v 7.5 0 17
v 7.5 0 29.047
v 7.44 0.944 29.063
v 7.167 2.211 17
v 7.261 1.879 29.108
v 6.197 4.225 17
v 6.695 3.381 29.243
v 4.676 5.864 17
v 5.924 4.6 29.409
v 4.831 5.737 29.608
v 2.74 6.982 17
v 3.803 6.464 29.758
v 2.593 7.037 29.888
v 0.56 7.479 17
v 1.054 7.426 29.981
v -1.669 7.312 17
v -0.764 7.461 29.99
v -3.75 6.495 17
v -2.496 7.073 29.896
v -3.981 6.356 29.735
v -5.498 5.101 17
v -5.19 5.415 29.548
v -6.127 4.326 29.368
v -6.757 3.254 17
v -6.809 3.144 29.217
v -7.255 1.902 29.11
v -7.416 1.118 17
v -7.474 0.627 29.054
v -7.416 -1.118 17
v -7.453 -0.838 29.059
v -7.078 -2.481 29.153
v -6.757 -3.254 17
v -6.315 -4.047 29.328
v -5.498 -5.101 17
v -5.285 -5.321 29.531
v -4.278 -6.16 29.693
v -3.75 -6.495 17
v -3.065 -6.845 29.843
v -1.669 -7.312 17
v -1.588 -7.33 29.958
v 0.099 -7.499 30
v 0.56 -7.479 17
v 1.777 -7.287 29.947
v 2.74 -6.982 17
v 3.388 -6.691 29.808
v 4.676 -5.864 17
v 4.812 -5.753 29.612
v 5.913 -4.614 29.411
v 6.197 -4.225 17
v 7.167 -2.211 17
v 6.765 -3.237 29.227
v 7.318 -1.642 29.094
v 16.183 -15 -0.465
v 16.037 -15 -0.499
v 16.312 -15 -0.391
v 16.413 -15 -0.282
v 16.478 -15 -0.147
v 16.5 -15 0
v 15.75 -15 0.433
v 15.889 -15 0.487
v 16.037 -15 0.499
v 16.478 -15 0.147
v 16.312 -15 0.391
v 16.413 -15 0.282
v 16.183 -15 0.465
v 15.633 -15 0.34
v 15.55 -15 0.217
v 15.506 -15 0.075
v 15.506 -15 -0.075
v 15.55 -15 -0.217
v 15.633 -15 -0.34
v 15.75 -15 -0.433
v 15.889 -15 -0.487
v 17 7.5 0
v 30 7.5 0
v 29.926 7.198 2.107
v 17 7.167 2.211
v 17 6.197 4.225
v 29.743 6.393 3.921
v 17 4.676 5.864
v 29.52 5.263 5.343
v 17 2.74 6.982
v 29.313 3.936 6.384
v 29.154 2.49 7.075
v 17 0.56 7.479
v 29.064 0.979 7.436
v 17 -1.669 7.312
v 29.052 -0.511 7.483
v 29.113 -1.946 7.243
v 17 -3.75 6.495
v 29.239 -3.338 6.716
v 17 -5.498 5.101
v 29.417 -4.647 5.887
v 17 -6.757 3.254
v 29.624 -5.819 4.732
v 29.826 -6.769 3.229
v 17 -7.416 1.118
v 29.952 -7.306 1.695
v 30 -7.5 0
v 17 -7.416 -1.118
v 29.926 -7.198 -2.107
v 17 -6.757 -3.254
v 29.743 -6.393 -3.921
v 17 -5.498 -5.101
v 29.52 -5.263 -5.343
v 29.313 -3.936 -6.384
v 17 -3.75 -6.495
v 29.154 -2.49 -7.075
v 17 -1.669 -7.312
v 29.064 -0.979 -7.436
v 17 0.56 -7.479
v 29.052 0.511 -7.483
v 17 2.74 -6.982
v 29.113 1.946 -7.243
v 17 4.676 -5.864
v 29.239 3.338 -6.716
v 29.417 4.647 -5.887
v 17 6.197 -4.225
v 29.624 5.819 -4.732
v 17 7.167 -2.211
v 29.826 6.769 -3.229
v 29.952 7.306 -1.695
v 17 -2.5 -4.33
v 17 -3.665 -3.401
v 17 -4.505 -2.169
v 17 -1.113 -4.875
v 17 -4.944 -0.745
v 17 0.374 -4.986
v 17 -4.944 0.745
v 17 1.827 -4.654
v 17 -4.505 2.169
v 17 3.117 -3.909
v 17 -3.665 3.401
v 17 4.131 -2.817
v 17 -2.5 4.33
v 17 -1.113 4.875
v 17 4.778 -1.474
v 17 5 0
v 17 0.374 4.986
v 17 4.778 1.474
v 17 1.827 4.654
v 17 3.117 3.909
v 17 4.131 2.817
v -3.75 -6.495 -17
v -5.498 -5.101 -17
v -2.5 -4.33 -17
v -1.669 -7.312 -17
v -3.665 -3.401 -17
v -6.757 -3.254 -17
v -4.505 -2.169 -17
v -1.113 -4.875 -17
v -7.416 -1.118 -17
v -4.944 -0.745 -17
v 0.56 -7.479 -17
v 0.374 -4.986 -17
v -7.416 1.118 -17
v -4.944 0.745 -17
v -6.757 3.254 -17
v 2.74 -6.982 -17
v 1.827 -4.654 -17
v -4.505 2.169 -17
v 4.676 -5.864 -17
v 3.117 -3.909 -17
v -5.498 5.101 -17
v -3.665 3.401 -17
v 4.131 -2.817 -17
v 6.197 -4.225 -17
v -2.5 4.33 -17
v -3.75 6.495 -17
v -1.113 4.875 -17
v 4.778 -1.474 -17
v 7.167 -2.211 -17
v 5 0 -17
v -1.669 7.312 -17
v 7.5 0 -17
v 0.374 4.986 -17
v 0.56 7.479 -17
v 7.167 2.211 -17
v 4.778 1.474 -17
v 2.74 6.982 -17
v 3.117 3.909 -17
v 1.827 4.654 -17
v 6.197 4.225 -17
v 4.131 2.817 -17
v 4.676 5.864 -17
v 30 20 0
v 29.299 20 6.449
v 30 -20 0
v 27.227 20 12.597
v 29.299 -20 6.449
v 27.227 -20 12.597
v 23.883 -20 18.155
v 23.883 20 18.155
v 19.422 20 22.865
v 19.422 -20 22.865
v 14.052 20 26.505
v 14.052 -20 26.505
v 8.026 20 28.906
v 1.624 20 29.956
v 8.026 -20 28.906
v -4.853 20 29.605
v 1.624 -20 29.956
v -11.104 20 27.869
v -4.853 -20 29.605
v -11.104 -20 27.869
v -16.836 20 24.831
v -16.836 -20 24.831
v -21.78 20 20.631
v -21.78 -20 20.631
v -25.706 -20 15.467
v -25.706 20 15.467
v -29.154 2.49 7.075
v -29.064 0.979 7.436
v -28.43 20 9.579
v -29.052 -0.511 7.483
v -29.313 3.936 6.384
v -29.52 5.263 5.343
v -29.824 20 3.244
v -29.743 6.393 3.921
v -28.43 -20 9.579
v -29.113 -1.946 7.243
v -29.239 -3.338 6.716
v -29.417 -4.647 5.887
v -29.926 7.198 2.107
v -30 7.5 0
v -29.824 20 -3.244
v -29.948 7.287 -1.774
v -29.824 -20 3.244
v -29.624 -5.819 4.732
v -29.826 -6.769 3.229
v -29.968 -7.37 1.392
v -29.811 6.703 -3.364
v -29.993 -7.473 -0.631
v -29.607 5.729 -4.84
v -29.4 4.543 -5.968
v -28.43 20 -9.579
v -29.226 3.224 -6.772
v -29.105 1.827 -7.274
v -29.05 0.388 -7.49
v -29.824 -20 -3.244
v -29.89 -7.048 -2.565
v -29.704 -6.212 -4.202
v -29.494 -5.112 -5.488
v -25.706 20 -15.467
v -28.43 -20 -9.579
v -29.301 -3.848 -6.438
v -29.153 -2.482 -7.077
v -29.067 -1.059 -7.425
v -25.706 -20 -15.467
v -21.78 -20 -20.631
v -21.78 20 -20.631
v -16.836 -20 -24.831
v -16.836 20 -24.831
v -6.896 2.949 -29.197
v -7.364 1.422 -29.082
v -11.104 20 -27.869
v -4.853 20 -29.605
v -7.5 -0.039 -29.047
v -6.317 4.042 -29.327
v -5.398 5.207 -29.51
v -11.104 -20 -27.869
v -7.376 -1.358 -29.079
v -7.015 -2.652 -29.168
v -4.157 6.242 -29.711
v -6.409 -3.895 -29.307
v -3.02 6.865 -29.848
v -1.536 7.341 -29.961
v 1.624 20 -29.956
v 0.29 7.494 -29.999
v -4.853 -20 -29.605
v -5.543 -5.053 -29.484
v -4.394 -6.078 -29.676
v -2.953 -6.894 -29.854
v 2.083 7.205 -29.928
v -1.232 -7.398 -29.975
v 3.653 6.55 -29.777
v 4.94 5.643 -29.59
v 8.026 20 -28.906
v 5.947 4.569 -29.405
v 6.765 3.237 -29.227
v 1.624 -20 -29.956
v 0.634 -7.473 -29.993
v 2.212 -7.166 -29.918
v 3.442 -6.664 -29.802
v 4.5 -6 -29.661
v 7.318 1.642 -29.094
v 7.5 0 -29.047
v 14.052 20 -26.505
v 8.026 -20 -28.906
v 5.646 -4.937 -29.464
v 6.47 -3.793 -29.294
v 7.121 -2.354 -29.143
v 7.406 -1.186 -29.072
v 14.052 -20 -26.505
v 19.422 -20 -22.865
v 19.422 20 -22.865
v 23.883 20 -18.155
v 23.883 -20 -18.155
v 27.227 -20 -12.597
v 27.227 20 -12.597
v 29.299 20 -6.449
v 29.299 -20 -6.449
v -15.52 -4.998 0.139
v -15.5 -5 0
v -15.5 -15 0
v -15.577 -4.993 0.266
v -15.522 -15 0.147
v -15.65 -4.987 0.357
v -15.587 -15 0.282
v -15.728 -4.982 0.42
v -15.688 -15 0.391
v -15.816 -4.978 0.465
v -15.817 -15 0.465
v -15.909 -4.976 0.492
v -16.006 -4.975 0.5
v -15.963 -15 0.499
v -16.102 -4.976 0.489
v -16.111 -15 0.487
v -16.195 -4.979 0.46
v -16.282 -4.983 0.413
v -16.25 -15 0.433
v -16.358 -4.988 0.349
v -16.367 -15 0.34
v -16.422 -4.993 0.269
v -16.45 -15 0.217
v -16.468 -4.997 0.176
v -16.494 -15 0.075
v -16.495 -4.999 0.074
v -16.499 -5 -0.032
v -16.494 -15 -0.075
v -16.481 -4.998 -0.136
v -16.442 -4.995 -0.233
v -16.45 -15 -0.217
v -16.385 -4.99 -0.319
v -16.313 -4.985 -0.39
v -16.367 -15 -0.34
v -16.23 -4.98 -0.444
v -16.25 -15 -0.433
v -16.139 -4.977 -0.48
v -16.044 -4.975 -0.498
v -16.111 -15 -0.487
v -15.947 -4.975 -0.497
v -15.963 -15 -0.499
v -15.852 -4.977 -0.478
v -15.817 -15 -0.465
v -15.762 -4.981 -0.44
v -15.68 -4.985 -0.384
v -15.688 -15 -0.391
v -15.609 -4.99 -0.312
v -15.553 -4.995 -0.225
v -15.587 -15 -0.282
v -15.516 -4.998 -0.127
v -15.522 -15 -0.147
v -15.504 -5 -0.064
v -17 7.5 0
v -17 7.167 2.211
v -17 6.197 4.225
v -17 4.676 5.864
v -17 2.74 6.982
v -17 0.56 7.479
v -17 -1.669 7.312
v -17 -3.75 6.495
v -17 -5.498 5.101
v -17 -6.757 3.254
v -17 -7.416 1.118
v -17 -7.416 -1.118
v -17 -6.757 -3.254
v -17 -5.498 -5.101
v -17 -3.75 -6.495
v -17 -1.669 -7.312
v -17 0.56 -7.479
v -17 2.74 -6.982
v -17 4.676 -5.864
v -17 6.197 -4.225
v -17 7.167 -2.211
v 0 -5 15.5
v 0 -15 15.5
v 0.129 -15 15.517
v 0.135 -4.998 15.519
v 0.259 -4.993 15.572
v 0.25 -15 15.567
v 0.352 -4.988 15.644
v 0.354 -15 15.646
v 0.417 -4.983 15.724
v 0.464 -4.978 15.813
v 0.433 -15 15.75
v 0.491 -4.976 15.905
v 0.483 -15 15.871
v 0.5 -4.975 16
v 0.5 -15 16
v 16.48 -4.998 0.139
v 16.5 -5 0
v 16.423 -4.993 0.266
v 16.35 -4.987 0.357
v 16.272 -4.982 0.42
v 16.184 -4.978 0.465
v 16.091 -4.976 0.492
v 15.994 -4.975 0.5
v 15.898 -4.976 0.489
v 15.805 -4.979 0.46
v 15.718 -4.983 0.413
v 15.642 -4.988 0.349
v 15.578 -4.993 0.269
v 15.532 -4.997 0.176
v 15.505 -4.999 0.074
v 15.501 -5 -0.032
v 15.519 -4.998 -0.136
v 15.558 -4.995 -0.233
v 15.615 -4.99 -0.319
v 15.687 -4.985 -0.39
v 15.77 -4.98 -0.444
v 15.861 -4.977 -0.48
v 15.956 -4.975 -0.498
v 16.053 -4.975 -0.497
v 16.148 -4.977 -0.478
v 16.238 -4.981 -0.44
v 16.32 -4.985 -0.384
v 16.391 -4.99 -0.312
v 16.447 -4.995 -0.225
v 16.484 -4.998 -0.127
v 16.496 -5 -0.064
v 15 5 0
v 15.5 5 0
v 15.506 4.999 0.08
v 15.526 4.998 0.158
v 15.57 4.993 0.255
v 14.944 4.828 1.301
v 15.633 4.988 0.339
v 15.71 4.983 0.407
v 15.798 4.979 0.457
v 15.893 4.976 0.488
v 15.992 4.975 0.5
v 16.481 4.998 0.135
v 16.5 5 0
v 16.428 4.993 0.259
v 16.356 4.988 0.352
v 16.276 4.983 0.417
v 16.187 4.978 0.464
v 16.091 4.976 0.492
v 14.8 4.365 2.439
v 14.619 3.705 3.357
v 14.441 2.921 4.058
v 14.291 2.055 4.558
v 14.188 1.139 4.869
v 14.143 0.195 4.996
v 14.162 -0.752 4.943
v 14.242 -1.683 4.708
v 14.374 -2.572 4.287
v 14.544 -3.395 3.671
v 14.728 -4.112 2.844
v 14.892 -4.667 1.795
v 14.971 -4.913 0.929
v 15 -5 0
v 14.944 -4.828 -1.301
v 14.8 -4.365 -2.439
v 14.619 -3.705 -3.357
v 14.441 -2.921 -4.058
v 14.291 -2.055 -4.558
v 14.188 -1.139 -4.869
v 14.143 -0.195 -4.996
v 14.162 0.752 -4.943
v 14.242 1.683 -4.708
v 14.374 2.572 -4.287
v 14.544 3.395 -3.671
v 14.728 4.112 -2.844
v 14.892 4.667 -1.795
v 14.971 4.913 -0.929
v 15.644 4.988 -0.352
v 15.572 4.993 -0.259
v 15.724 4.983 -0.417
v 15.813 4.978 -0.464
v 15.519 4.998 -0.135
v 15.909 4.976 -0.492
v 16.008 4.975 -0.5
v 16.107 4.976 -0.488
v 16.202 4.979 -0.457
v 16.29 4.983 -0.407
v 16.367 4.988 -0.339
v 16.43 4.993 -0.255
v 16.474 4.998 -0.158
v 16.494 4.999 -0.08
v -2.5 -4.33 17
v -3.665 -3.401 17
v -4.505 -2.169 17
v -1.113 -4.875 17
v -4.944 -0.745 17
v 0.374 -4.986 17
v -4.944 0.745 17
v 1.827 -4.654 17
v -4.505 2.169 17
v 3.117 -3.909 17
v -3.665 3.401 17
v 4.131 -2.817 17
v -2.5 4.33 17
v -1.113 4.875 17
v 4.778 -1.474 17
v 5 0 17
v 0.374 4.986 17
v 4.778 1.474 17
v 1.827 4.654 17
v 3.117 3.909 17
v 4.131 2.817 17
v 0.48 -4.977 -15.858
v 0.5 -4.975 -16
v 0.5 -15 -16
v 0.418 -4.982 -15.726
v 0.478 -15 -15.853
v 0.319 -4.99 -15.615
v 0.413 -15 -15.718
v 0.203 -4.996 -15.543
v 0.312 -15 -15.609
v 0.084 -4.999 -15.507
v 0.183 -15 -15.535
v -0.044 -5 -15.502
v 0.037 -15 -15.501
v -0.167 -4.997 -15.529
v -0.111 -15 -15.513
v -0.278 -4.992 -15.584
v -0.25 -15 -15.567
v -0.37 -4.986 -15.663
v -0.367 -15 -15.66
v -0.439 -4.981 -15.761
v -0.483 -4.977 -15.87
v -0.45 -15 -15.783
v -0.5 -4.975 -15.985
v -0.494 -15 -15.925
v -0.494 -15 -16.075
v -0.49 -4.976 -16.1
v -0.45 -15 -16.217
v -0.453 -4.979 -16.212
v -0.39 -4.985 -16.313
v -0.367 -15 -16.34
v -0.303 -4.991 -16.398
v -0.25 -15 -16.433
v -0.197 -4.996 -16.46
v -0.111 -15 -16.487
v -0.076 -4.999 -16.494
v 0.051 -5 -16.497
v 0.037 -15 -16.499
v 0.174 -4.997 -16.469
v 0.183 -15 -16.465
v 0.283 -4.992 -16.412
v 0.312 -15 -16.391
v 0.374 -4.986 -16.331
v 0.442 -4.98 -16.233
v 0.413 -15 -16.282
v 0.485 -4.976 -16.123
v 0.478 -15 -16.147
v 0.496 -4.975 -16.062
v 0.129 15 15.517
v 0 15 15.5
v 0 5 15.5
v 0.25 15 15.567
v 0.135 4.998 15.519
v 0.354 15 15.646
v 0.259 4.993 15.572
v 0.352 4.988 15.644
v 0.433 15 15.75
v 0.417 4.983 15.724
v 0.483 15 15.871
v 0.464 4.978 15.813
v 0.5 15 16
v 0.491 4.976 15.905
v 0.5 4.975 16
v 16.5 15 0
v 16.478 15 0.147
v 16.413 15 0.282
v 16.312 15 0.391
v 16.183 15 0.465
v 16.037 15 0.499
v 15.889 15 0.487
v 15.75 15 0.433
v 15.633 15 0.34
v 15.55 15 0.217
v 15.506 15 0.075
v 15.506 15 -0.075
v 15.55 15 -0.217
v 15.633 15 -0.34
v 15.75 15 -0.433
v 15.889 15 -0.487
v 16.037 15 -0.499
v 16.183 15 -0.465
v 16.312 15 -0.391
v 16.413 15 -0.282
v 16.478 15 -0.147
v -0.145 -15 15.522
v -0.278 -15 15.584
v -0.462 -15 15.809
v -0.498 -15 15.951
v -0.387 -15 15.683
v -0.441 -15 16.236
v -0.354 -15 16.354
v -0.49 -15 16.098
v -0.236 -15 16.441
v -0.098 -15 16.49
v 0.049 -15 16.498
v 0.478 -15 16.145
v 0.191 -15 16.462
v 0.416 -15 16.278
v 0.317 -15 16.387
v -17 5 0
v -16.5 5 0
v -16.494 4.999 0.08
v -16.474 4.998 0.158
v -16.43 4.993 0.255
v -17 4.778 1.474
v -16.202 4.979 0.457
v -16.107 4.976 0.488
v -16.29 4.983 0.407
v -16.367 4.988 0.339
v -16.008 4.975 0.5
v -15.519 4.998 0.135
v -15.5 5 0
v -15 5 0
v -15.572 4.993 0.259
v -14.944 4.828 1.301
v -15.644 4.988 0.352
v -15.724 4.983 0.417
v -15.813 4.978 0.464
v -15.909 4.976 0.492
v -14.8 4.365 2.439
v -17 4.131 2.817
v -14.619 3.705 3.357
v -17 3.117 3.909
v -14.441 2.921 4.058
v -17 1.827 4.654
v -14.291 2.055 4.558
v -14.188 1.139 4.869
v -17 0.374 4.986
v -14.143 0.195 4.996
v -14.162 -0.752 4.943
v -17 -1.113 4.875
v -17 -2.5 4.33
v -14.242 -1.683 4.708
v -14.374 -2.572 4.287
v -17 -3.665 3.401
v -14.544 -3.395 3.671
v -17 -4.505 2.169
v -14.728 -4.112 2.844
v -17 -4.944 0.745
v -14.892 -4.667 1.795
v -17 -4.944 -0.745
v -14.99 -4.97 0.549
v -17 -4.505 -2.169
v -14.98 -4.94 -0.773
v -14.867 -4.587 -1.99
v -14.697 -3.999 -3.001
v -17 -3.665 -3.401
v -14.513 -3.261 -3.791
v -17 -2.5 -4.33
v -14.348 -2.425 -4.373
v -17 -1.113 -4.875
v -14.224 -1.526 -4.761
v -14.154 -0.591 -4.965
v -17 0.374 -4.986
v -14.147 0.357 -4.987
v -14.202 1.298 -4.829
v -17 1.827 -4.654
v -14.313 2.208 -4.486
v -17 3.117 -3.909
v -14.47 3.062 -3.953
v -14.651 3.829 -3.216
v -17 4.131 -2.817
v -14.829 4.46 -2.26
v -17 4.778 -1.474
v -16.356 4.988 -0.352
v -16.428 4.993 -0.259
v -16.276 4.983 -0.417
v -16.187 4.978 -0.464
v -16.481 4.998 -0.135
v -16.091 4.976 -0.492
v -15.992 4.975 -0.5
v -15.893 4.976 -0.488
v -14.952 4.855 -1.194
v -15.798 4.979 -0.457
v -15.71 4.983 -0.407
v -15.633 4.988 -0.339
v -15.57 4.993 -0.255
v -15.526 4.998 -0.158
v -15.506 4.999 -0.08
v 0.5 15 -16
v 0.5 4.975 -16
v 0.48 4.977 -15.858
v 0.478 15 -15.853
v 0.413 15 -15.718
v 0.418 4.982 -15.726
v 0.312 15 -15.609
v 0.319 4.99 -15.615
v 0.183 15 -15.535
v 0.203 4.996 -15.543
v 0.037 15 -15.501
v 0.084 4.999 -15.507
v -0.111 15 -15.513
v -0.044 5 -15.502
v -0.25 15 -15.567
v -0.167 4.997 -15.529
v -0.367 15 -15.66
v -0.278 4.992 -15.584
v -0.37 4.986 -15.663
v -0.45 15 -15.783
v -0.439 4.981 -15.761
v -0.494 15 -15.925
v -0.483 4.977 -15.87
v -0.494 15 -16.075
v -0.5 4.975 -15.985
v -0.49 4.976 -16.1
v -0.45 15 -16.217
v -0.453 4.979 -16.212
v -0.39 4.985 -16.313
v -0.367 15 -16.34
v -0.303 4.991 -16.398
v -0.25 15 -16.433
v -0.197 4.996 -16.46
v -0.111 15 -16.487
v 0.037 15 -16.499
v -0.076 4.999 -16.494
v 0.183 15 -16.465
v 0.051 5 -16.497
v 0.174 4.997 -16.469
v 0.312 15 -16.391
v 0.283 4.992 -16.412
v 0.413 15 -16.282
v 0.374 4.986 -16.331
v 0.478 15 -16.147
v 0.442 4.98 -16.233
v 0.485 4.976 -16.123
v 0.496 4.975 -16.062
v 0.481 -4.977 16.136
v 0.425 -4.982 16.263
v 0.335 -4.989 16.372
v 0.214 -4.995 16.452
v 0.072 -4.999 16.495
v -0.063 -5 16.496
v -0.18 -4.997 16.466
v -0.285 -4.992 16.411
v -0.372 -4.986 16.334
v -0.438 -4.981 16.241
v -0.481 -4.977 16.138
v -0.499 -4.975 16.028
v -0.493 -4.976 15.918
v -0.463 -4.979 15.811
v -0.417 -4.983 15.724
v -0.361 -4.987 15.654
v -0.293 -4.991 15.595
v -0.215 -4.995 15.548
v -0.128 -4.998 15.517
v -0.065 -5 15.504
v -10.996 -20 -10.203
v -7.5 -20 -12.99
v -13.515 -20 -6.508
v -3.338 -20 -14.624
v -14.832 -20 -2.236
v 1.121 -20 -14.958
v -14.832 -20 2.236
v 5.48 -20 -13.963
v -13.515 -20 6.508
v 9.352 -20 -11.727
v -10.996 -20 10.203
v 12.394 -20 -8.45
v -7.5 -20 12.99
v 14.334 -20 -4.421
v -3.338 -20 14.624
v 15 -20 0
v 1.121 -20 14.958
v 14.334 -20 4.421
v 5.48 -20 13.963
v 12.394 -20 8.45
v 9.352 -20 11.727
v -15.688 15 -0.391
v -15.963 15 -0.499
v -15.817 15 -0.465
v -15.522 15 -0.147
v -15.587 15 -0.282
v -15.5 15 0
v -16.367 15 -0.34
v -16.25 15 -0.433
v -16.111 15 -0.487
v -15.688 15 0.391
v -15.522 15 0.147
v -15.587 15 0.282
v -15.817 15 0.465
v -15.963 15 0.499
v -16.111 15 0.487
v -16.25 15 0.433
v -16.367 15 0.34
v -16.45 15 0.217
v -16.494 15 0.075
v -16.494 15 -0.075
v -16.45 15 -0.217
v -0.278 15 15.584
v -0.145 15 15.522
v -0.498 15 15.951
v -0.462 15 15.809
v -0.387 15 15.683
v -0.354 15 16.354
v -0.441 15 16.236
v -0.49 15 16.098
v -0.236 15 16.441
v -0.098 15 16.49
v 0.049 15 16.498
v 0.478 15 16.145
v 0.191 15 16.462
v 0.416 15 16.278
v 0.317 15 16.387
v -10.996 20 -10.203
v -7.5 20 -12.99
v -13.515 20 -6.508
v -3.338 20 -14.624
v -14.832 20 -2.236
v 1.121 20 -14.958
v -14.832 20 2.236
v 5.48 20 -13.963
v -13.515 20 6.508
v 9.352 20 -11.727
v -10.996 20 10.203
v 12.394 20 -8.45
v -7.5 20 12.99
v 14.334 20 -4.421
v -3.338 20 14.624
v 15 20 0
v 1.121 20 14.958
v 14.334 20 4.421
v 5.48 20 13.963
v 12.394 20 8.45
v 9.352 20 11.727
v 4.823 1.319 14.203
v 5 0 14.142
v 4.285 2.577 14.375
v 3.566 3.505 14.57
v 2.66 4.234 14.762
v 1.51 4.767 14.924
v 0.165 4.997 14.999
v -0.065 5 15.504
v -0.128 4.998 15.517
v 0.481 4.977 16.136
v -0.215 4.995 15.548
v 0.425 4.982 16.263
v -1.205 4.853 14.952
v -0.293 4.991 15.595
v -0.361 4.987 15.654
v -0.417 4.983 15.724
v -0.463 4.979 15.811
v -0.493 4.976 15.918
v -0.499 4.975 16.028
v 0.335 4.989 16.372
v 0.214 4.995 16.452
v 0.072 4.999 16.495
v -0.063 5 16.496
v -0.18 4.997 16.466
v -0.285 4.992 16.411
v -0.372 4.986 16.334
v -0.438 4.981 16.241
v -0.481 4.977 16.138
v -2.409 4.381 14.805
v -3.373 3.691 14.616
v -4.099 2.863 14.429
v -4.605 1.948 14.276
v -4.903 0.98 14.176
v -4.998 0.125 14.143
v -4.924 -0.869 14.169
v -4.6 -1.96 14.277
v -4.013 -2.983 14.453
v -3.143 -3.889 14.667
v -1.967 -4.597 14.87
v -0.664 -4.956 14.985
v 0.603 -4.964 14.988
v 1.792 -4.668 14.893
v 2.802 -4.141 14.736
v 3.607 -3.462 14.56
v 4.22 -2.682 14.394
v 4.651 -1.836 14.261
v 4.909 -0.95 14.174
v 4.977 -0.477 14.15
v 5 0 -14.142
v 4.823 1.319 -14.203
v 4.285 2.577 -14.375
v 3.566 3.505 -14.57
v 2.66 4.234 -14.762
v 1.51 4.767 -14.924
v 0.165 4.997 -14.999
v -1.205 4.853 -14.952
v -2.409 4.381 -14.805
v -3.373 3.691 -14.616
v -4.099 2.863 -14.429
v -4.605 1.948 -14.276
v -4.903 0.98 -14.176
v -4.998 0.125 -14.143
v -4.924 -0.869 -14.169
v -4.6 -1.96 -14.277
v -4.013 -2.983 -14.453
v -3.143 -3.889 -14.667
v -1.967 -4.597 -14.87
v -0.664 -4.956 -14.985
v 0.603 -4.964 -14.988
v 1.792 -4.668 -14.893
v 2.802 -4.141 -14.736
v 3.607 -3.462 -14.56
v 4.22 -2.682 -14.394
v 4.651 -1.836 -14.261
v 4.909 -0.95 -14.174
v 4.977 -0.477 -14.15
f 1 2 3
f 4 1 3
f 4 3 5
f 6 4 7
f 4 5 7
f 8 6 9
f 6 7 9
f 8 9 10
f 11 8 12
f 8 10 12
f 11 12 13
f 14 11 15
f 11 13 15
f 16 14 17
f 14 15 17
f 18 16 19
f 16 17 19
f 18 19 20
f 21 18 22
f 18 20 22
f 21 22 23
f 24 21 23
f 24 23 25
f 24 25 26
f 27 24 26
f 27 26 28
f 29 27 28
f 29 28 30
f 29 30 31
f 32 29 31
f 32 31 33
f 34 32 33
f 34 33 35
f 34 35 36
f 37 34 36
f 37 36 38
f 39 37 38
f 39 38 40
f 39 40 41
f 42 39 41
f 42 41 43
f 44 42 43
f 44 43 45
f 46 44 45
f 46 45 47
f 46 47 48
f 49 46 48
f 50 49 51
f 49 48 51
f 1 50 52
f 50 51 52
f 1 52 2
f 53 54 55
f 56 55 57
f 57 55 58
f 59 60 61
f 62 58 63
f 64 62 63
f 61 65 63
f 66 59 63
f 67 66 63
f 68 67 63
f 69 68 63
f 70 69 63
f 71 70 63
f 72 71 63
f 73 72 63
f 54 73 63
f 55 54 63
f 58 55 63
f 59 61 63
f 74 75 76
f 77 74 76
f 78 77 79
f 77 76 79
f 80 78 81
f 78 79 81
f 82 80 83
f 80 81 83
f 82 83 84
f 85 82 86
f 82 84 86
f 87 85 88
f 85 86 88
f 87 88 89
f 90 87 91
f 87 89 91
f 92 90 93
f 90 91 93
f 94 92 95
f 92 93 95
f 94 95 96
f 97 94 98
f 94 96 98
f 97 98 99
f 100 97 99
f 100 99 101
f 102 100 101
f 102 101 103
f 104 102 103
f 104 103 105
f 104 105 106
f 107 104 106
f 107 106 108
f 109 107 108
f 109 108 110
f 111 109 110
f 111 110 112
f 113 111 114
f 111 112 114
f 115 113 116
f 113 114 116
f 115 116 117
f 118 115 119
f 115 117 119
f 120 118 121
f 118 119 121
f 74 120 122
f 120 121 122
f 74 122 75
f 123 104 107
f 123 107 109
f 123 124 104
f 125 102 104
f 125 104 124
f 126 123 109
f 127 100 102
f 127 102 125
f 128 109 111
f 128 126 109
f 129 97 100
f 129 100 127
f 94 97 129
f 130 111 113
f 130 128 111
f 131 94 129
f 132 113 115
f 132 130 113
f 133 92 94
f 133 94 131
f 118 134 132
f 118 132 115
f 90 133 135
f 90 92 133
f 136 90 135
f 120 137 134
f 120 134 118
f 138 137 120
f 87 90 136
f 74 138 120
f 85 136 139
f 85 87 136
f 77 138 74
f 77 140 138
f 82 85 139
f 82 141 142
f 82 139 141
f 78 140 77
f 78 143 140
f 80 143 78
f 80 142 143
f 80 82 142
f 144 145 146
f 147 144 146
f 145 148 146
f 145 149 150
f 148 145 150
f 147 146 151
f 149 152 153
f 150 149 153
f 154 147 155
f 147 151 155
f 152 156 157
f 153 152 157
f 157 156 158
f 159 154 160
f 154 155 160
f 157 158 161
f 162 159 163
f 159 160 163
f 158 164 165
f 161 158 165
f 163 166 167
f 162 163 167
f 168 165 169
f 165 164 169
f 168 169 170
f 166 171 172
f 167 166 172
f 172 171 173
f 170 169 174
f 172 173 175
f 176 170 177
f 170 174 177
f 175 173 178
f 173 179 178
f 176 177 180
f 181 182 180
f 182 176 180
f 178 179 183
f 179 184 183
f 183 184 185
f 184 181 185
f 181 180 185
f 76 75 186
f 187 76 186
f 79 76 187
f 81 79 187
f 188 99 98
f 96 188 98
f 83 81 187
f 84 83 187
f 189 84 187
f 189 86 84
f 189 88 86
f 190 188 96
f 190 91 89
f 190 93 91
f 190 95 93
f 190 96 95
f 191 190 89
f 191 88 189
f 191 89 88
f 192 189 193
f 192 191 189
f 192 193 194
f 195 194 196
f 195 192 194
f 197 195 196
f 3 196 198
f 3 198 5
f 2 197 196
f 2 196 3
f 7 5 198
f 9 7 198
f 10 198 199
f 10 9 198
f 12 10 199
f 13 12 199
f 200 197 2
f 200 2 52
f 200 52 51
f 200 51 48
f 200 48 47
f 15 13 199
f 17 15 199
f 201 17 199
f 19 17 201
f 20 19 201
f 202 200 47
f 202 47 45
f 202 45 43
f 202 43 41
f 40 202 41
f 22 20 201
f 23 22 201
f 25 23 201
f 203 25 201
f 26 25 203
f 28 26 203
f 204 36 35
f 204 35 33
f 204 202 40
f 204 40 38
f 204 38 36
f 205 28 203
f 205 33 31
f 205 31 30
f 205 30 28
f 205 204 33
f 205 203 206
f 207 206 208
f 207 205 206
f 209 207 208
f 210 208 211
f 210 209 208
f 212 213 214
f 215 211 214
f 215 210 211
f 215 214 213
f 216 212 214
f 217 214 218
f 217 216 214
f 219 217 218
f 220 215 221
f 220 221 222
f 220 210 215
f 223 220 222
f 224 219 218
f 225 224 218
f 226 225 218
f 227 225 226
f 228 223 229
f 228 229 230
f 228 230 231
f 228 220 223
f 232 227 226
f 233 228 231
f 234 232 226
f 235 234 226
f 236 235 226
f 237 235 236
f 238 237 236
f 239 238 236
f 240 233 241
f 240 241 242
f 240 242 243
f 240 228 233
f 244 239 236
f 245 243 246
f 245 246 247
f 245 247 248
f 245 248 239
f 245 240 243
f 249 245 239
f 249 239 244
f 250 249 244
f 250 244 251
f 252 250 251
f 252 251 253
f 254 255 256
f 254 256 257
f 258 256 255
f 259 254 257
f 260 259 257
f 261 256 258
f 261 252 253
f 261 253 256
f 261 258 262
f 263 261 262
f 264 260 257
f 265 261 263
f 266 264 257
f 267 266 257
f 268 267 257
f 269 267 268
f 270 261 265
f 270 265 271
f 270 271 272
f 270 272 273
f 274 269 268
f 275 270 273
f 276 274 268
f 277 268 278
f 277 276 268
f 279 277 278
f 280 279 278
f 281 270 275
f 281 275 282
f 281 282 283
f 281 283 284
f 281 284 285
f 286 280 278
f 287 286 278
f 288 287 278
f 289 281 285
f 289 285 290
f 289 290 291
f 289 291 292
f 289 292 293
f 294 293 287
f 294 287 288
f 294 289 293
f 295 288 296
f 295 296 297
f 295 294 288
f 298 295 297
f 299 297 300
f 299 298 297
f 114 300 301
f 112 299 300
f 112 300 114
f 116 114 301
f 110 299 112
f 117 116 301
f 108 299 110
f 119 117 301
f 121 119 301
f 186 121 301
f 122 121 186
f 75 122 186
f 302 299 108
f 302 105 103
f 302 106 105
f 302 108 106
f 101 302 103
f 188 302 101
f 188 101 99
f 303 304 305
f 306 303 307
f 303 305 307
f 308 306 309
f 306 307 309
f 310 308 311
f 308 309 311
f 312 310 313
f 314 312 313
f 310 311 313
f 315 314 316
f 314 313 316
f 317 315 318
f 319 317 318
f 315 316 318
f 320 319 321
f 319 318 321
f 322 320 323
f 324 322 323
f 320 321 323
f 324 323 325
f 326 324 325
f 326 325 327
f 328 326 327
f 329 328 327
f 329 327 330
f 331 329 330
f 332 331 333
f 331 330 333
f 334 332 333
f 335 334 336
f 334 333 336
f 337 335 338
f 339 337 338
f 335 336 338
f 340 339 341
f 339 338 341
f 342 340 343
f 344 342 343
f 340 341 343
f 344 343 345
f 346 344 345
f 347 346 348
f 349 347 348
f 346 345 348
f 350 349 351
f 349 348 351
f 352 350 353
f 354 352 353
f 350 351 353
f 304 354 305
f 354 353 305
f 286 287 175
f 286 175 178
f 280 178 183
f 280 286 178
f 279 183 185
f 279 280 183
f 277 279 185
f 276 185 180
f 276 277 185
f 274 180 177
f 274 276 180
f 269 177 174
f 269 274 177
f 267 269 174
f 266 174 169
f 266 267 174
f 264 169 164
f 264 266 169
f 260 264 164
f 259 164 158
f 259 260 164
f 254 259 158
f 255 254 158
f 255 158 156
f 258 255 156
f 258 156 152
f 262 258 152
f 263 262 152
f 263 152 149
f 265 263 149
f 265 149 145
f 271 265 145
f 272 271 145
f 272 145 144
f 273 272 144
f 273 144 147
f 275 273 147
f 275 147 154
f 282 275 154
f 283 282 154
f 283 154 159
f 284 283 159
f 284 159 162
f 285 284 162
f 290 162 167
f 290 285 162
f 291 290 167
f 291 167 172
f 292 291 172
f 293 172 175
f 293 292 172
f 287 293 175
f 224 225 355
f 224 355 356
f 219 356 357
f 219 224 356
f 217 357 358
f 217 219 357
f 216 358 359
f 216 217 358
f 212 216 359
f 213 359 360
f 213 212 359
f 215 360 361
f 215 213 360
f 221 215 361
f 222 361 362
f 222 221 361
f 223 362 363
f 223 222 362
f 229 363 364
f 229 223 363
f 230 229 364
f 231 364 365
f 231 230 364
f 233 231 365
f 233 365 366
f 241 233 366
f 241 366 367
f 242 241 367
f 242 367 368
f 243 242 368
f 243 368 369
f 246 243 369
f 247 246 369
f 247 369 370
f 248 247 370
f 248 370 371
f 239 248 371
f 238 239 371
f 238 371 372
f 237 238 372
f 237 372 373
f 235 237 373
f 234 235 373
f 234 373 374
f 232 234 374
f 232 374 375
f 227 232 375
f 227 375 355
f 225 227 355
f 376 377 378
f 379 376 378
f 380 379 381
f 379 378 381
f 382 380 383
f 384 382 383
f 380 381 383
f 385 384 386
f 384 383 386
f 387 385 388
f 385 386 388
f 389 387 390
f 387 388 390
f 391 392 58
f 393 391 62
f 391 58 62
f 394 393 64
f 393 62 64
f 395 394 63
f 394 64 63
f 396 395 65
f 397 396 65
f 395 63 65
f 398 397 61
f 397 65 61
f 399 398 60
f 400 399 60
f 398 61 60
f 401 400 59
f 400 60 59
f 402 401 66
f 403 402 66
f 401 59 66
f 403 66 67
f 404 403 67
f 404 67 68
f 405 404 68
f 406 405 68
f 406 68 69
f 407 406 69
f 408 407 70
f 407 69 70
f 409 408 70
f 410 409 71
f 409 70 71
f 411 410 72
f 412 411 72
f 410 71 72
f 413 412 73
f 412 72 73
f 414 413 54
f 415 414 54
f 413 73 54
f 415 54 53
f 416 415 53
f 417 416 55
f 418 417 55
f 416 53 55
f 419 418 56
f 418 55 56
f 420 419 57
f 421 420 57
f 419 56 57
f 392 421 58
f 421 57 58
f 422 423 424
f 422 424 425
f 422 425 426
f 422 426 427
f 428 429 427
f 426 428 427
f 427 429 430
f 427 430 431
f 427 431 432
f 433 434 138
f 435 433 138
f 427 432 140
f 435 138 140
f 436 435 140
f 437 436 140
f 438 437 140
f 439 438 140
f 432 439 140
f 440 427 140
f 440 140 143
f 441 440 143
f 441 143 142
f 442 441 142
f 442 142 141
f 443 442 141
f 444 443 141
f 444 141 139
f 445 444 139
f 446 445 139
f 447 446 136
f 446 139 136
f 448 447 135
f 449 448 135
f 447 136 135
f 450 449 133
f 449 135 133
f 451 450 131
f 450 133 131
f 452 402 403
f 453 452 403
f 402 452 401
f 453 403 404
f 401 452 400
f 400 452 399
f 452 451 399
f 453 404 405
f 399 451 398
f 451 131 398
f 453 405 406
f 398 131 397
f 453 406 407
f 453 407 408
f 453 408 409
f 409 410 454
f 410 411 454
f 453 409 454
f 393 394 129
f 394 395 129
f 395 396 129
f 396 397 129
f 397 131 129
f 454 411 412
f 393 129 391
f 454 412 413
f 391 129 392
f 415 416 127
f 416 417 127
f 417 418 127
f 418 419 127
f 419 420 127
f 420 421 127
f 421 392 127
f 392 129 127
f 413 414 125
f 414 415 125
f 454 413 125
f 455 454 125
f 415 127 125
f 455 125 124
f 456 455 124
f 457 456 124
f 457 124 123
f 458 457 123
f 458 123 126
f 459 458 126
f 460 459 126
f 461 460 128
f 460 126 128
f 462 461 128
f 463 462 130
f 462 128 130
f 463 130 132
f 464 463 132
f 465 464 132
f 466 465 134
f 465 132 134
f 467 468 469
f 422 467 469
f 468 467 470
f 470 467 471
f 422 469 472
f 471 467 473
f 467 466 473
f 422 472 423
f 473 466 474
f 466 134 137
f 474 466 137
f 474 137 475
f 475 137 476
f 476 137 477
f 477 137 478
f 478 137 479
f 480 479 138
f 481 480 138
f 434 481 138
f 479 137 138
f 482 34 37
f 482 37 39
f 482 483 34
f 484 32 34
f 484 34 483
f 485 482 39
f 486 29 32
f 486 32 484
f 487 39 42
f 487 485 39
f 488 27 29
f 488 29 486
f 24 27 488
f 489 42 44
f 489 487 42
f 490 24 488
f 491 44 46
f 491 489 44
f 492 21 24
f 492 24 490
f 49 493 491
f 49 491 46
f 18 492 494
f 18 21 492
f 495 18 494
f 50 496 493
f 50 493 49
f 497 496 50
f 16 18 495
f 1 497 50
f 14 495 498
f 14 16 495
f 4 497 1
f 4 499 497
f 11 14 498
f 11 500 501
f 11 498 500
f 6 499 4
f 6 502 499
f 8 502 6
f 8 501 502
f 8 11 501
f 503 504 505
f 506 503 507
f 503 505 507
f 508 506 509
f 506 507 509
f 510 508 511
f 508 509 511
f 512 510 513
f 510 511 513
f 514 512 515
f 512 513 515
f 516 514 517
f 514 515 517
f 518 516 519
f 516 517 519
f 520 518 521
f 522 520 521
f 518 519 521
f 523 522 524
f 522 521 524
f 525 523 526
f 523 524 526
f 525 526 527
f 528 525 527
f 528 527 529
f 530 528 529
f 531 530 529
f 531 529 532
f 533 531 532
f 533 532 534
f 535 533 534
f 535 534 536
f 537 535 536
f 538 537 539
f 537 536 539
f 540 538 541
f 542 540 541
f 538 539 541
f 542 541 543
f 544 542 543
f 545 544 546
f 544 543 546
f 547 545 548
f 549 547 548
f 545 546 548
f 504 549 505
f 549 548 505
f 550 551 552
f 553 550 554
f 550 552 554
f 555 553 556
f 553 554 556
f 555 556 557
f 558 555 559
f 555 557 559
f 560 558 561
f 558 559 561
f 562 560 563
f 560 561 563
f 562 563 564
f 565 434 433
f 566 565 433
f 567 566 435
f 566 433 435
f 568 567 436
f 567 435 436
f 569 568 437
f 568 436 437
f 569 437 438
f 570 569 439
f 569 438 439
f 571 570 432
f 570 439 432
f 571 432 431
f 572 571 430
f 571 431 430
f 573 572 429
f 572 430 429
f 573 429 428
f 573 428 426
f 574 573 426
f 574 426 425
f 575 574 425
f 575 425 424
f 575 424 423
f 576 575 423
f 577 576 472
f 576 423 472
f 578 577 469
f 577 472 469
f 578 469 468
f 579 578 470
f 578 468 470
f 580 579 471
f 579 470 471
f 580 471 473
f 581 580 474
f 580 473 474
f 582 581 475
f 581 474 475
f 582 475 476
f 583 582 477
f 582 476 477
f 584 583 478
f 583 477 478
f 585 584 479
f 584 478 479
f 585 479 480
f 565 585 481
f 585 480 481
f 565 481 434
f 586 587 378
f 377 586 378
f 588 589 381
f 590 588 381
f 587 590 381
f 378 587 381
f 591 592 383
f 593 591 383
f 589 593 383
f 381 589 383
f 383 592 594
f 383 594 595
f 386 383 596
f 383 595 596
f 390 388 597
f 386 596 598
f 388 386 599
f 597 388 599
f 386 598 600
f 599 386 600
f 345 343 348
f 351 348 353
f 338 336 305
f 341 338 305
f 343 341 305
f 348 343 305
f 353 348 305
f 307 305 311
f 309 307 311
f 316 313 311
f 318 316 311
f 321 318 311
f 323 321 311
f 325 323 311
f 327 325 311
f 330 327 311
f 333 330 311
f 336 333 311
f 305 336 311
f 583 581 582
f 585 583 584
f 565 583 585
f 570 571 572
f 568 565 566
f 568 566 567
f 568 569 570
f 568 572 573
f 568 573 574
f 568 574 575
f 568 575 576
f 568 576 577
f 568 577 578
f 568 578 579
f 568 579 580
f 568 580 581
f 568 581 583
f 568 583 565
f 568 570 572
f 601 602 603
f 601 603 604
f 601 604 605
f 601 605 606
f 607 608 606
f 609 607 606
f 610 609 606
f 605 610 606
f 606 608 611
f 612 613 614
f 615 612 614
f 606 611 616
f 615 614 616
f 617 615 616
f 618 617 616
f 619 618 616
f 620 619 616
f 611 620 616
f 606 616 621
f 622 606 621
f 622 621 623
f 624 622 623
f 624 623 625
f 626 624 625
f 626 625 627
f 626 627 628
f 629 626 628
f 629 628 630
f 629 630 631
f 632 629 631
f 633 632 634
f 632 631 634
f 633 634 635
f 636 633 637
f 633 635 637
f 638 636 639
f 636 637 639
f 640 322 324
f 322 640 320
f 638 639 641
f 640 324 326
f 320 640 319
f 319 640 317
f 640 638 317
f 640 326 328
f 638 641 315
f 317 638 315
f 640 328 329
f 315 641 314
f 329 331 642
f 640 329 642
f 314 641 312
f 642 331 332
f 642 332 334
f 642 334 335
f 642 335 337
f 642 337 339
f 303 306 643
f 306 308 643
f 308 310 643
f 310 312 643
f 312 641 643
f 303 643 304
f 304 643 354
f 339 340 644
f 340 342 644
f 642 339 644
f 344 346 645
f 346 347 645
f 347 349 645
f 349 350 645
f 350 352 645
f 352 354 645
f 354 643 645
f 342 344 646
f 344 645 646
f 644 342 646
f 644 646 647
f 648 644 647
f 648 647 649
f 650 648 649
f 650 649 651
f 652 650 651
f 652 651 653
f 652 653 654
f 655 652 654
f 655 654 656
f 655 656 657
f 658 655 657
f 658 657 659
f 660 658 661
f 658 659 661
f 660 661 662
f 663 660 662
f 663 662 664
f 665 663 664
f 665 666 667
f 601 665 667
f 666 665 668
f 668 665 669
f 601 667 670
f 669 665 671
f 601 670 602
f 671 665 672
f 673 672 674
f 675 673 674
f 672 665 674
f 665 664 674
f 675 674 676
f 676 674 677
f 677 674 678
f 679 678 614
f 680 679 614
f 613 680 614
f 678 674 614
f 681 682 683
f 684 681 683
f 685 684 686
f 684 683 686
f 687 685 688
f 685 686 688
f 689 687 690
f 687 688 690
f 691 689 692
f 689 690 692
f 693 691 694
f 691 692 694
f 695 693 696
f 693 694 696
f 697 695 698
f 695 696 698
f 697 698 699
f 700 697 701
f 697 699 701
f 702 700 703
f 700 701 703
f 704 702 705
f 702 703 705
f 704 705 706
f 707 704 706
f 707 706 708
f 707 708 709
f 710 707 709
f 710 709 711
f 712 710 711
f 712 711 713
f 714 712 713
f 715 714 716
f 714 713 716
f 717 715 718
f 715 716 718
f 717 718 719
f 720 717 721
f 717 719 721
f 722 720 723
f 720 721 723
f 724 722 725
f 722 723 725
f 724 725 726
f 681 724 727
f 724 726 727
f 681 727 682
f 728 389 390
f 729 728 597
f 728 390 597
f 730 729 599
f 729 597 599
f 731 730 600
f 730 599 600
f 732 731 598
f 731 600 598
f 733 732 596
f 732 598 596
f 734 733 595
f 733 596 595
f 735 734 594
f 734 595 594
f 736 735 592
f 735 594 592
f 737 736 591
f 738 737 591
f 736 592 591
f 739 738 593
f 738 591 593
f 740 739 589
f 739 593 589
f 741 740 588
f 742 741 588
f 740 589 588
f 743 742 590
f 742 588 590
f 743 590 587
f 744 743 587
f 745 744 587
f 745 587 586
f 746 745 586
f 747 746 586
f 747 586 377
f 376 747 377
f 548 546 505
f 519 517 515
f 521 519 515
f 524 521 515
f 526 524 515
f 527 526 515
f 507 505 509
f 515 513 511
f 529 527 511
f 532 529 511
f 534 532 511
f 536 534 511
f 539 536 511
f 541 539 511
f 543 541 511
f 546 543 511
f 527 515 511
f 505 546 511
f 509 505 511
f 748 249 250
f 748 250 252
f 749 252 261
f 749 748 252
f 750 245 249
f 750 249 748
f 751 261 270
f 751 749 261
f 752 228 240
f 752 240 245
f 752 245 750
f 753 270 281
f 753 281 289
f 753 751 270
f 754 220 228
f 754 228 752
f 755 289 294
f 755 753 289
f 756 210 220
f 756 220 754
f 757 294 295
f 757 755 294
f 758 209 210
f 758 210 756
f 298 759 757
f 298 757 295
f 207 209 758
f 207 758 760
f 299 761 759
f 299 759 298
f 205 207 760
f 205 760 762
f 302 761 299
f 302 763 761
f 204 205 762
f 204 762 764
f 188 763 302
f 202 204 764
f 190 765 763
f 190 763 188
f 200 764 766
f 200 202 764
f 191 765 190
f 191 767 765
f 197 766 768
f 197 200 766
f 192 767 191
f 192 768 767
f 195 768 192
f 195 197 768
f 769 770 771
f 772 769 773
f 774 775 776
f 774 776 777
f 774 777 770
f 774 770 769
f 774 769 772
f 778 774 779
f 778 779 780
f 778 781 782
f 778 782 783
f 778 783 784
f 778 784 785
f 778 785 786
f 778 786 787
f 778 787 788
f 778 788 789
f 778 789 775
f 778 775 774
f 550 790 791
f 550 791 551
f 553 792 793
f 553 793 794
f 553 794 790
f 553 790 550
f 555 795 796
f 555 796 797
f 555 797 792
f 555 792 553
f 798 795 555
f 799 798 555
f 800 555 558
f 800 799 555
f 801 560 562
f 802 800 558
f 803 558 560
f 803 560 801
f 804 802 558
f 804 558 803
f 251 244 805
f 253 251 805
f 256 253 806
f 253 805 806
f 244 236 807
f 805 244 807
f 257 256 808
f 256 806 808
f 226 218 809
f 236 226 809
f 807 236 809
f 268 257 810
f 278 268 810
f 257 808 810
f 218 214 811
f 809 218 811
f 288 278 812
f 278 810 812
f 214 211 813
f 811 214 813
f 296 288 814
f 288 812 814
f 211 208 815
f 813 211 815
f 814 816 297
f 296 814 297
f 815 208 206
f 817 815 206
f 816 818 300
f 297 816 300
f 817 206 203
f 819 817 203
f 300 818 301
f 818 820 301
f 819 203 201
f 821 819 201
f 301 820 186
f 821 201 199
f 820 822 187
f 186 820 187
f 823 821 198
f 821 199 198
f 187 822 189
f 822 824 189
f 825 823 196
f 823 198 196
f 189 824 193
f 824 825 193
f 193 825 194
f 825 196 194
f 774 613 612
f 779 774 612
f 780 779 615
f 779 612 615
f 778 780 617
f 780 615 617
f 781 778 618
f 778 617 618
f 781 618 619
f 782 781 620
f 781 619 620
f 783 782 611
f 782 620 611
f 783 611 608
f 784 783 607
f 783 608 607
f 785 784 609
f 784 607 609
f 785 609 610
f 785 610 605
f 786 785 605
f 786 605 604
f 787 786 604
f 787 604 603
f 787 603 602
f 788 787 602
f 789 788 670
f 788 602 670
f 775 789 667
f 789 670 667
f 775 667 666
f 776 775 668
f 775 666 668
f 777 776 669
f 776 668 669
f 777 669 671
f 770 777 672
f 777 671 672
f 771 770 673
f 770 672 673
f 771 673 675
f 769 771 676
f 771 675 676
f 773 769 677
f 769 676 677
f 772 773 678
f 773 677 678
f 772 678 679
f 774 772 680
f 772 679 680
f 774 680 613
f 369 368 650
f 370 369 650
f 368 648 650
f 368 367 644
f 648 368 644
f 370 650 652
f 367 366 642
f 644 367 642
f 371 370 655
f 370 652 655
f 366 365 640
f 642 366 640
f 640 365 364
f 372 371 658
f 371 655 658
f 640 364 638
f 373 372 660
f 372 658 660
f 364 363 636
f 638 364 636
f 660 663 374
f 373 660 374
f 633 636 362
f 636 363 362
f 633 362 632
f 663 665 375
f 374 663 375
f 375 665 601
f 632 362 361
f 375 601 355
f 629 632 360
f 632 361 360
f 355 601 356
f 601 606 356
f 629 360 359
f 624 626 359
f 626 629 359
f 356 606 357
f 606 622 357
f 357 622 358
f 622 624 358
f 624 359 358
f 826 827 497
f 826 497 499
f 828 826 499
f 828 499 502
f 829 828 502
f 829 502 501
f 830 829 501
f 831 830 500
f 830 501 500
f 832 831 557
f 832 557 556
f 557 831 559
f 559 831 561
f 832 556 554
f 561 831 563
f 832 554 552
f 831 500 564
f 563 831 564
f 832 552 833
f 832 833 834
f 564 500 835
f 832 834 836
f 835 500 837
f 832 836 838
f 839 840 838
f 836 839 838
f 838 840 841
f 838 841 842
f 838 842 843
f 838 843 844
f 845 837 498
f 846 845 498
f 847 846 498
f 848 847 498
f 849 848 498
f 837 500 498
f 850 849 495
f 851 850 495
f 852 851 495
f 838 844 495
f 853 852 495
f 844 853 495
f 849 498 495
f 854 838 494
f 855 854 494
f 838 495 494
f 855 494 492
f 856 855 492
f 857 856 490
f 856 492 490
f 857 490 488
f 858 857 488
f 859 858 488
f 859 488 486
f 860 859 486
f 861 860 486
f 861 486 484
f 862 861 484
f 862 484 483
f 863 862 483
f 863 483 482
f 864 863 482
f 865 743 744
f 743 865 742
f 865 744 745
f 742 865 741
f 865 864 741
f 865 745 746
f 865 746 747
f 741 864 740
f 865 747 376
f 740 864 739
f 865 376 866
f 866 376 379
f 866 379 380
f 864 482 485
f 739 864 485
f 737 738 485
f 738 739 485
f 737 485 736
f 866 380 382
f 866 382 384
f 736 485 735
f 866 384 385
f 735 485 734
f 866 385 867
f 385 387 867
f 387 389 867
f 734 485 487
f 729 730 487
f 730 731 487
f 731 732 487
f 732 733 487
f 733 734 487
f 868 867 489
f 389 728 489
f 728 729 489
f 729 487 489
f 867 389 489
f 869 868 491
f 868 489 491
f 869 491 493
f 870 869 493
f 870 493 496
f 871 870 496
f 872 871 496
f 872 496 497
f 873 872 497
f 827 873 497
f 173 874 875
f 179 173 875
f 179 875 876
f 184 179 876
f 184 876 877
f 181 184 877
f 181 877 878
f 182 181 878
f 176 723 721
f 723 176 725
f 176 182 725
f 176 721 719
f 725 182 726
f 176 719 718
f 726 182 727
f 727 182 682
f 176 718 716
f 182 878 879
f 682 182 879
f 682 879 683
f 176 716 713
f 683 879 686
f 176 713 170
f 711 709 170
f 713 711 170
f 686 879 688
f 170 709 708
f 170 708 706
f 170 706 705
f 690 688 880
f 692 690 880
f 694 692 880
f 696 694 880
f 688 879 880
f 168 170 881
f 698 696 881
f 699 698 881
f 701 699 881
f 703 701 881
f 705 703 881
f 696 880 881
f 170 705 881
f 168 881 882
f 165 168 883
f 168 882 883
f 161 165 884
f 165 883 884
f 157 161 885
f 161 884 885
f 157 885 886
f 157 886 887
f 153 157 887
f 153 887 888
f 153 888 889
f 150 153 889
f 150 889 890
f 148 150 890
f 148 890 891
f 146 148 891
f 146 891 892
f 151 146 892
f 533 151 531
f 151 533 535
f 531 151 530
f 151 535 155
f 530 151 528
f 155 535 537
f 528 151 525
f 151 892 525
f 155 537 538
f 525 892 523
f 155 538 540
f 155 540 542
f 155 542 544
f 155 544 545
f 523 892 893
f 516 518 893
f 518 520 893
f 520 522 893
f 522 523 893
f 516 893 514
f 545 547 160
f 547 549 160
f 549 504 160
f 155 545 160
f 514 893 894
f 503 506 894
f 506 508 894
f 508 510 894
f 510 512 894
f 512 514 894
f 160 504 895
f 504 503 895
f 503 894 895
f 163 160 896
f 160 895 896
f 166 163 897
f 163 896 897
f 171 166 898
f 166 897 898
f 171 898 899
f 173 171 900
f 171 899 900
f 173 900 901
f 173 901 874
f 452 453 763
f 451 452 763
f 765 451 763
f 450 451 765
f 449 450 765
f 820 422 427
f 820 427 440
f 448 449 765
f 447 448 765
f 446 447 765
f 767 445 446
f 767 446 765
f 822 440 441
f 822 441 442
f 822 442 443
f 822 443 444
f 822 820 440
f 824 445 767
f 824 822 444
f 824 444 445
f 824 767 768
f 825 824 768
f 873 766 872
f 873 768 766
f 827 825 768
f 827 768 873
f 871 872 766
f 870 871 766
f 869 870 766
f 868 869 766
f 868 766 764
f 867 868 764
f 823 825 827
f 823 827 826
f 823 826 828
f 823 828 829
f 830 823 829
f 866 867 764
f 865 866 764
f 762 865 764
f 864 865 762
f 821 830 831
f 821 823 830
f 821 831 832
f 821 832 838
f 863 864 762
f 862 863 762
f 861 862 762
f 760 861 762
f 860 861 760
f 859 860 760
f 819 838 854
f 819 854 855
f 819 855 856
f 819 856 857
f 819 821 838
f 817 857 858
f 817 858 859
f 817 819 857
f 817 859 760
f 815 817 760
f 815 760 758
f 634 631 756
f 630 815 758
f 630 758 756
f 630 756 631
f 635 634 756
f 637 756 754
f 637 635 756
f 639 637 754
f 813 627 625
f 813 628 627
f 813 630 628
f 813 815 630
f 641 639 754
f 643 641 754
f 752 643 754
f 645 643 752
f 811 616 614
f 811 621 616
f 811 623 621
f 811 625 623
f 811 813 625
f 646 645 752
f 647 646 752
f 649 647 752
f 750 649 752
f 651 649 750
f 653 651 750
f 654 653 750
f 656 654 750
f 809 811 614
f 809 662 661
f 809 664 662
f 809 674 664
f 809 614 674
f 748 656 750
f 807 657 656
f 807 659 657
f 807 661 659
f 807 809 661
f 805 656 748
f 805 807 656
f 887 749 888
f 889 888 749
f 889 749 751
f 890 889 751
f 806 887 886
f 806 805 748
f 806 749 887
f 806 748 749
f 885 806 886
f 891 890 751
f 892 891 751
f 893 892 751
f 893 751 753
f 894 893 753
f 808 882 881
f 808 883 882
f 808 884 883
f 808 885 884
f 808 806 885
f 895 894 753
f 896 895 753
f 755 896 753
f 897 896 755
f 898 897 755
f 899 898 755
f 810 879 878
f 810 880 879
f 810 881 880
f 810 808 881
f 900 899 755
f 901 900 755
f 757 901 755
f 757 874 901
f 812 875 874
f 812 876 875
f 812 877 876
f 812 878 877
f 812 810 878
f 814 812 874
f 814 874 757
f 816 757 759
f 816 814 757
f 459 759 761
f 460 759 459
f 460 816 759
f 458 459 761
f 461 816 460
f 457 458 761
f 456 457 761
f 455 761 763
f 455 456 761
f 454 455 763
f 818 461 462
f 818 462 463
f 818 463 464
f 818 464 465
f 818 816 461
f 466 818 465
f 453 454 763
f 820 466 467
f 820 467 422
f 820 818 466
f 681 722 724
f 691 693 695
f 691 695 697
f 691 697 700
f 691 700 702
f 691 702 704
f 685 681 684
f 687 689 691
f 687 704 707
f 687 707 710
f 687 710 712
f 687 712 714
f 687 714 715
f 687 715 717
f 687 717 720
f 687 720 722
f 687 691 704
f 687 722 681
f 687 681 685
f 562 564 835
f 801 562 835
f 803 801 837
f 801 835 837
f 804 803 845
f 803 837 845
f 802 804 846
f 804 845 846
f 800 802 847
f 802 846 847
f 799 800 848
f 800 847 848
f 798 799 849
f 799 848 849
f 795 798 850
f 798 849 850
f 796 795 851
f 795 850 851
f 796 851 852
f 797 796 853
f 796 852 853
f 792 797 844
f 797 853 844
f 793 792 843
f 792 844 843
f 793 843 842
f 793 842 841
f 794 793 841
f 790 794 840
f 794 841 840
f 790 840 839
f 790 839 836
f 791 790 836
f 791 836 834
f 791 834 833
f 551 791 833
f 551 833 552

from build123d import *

# Parameters (mm, degrees)
F0_R      = 30
F0_R_2    = 15
F1_DEPTH  = 20
F3_R      = 7.5
F4_DEPTH  = 13
F5_R      = 5
F6_DEPTH  = 65.5
F8_R      = 7.5
F9_DEPTH  = 13
F12_R     = 7.5
F13_DEPTH = 13
F14_R     = 5
F15_DEPTH = 92
F16_R     = 7.5
F17_DEPTH = 13
F19_DEPTH = 15
F18_R     = 0.5
F20_DEPTH = 15
F21_DEPTH = 15
F22_DEPTH = 15


with BuildPart() as f1:
    # F0 (on Front) → F1 (new body, symmetric)
    with BuildSketch(Plane.XZ):
        Circle(F0_R)
        Circle(F0_R_2, mode=Mode.SUBTRACT)
    extrude(amount=F1_DEPTH, both=True)

    # F3 (on offset) → F4 (cut)
    with BuildSketch(Plane.XY.offset(30)):
        Circle(F3_R)
    extrude(amount=-F4_DEPTH, mode=Mode.SUBTRACT)

    # F5 (on offset) → F6 (cut)
    with BuildSketch(Plane.XY.offset(30)):
        Circle(F5_R)
    extrude(amount=-F6_DEPTH, mode=Mode.SUBTRACT)

    # F8 (on offset) → F9 (cut)
    with BuildSketch(Plane.XY.offset(-30)):
        Circle(F8_R)
    extrude(amount=F9_DEPTH, mode=Mode.SUBTRACT)

    # F12 (on offset) → F13 (cut)
    with BuildSketch(Plane.YZ.offset(30)):
        Circle(F12_R)
    extrude(amount=-F13_DEPTH, mode=Mode.SUBTRACT)

    # F14 (on offset) → F15 (cut)
    with BuildSketch(Plane.YZ.offset(30)):
        Circle(F14_R)
    extrude(amount=-F15_DEPTH, mode=Mode.SUBTRACT)

    # F16 (on offset) → F17 (cut)
    with BuildSketch(Plane.YZ.offset(-30)):
        Circle(F16_R)
    extrude(amount=F17_DEPTH, mode=Mode.SUBTRACT)

    # F18 (on Front) → F19 (cut, symmetric)
    with BuildSketch(Plane.XZ):
        with BuildLine():
            ThreePointArc((0, 15.5), (0.353553, 15.646447), (0.5, 16))
            ThreePointArc((0.5, 16), (-0.353553, 16.353553), (0, 15.5))
        make_face()
    extrude(amount=F19_DEPTH, both=True, mode=Mode.SUBTRACT)

    # F18 (on Front) → F20 (cut, symmetric)
    with BuildSketch(Plane.XZ):
        with Locations((16, 0)):
            Circle(F18_R)
    extrude(amount=F20_DEPTH, both=True, mode=Mode.SUBTRACT)

    # F18 (on Front) → F21 (cut, symmetric)
    with BuildSketch(Plane.XZ):
        with Locations((0, -16)):
            Circle(F18_R)
    extrude(amount=F21_DEPTH, both=True, mode=Mode.SUBTRACT)

    # F18 (on Front) → F22 (cut, symmetric)
    with BuildSketch(Plane.XZ):
        with Locations((-16, 0)):
            Circle(F18_R)
    extrude(amount=F22_DEPTH, both=True, mode=Mode.SUBTRACT)


solid = f1.part
